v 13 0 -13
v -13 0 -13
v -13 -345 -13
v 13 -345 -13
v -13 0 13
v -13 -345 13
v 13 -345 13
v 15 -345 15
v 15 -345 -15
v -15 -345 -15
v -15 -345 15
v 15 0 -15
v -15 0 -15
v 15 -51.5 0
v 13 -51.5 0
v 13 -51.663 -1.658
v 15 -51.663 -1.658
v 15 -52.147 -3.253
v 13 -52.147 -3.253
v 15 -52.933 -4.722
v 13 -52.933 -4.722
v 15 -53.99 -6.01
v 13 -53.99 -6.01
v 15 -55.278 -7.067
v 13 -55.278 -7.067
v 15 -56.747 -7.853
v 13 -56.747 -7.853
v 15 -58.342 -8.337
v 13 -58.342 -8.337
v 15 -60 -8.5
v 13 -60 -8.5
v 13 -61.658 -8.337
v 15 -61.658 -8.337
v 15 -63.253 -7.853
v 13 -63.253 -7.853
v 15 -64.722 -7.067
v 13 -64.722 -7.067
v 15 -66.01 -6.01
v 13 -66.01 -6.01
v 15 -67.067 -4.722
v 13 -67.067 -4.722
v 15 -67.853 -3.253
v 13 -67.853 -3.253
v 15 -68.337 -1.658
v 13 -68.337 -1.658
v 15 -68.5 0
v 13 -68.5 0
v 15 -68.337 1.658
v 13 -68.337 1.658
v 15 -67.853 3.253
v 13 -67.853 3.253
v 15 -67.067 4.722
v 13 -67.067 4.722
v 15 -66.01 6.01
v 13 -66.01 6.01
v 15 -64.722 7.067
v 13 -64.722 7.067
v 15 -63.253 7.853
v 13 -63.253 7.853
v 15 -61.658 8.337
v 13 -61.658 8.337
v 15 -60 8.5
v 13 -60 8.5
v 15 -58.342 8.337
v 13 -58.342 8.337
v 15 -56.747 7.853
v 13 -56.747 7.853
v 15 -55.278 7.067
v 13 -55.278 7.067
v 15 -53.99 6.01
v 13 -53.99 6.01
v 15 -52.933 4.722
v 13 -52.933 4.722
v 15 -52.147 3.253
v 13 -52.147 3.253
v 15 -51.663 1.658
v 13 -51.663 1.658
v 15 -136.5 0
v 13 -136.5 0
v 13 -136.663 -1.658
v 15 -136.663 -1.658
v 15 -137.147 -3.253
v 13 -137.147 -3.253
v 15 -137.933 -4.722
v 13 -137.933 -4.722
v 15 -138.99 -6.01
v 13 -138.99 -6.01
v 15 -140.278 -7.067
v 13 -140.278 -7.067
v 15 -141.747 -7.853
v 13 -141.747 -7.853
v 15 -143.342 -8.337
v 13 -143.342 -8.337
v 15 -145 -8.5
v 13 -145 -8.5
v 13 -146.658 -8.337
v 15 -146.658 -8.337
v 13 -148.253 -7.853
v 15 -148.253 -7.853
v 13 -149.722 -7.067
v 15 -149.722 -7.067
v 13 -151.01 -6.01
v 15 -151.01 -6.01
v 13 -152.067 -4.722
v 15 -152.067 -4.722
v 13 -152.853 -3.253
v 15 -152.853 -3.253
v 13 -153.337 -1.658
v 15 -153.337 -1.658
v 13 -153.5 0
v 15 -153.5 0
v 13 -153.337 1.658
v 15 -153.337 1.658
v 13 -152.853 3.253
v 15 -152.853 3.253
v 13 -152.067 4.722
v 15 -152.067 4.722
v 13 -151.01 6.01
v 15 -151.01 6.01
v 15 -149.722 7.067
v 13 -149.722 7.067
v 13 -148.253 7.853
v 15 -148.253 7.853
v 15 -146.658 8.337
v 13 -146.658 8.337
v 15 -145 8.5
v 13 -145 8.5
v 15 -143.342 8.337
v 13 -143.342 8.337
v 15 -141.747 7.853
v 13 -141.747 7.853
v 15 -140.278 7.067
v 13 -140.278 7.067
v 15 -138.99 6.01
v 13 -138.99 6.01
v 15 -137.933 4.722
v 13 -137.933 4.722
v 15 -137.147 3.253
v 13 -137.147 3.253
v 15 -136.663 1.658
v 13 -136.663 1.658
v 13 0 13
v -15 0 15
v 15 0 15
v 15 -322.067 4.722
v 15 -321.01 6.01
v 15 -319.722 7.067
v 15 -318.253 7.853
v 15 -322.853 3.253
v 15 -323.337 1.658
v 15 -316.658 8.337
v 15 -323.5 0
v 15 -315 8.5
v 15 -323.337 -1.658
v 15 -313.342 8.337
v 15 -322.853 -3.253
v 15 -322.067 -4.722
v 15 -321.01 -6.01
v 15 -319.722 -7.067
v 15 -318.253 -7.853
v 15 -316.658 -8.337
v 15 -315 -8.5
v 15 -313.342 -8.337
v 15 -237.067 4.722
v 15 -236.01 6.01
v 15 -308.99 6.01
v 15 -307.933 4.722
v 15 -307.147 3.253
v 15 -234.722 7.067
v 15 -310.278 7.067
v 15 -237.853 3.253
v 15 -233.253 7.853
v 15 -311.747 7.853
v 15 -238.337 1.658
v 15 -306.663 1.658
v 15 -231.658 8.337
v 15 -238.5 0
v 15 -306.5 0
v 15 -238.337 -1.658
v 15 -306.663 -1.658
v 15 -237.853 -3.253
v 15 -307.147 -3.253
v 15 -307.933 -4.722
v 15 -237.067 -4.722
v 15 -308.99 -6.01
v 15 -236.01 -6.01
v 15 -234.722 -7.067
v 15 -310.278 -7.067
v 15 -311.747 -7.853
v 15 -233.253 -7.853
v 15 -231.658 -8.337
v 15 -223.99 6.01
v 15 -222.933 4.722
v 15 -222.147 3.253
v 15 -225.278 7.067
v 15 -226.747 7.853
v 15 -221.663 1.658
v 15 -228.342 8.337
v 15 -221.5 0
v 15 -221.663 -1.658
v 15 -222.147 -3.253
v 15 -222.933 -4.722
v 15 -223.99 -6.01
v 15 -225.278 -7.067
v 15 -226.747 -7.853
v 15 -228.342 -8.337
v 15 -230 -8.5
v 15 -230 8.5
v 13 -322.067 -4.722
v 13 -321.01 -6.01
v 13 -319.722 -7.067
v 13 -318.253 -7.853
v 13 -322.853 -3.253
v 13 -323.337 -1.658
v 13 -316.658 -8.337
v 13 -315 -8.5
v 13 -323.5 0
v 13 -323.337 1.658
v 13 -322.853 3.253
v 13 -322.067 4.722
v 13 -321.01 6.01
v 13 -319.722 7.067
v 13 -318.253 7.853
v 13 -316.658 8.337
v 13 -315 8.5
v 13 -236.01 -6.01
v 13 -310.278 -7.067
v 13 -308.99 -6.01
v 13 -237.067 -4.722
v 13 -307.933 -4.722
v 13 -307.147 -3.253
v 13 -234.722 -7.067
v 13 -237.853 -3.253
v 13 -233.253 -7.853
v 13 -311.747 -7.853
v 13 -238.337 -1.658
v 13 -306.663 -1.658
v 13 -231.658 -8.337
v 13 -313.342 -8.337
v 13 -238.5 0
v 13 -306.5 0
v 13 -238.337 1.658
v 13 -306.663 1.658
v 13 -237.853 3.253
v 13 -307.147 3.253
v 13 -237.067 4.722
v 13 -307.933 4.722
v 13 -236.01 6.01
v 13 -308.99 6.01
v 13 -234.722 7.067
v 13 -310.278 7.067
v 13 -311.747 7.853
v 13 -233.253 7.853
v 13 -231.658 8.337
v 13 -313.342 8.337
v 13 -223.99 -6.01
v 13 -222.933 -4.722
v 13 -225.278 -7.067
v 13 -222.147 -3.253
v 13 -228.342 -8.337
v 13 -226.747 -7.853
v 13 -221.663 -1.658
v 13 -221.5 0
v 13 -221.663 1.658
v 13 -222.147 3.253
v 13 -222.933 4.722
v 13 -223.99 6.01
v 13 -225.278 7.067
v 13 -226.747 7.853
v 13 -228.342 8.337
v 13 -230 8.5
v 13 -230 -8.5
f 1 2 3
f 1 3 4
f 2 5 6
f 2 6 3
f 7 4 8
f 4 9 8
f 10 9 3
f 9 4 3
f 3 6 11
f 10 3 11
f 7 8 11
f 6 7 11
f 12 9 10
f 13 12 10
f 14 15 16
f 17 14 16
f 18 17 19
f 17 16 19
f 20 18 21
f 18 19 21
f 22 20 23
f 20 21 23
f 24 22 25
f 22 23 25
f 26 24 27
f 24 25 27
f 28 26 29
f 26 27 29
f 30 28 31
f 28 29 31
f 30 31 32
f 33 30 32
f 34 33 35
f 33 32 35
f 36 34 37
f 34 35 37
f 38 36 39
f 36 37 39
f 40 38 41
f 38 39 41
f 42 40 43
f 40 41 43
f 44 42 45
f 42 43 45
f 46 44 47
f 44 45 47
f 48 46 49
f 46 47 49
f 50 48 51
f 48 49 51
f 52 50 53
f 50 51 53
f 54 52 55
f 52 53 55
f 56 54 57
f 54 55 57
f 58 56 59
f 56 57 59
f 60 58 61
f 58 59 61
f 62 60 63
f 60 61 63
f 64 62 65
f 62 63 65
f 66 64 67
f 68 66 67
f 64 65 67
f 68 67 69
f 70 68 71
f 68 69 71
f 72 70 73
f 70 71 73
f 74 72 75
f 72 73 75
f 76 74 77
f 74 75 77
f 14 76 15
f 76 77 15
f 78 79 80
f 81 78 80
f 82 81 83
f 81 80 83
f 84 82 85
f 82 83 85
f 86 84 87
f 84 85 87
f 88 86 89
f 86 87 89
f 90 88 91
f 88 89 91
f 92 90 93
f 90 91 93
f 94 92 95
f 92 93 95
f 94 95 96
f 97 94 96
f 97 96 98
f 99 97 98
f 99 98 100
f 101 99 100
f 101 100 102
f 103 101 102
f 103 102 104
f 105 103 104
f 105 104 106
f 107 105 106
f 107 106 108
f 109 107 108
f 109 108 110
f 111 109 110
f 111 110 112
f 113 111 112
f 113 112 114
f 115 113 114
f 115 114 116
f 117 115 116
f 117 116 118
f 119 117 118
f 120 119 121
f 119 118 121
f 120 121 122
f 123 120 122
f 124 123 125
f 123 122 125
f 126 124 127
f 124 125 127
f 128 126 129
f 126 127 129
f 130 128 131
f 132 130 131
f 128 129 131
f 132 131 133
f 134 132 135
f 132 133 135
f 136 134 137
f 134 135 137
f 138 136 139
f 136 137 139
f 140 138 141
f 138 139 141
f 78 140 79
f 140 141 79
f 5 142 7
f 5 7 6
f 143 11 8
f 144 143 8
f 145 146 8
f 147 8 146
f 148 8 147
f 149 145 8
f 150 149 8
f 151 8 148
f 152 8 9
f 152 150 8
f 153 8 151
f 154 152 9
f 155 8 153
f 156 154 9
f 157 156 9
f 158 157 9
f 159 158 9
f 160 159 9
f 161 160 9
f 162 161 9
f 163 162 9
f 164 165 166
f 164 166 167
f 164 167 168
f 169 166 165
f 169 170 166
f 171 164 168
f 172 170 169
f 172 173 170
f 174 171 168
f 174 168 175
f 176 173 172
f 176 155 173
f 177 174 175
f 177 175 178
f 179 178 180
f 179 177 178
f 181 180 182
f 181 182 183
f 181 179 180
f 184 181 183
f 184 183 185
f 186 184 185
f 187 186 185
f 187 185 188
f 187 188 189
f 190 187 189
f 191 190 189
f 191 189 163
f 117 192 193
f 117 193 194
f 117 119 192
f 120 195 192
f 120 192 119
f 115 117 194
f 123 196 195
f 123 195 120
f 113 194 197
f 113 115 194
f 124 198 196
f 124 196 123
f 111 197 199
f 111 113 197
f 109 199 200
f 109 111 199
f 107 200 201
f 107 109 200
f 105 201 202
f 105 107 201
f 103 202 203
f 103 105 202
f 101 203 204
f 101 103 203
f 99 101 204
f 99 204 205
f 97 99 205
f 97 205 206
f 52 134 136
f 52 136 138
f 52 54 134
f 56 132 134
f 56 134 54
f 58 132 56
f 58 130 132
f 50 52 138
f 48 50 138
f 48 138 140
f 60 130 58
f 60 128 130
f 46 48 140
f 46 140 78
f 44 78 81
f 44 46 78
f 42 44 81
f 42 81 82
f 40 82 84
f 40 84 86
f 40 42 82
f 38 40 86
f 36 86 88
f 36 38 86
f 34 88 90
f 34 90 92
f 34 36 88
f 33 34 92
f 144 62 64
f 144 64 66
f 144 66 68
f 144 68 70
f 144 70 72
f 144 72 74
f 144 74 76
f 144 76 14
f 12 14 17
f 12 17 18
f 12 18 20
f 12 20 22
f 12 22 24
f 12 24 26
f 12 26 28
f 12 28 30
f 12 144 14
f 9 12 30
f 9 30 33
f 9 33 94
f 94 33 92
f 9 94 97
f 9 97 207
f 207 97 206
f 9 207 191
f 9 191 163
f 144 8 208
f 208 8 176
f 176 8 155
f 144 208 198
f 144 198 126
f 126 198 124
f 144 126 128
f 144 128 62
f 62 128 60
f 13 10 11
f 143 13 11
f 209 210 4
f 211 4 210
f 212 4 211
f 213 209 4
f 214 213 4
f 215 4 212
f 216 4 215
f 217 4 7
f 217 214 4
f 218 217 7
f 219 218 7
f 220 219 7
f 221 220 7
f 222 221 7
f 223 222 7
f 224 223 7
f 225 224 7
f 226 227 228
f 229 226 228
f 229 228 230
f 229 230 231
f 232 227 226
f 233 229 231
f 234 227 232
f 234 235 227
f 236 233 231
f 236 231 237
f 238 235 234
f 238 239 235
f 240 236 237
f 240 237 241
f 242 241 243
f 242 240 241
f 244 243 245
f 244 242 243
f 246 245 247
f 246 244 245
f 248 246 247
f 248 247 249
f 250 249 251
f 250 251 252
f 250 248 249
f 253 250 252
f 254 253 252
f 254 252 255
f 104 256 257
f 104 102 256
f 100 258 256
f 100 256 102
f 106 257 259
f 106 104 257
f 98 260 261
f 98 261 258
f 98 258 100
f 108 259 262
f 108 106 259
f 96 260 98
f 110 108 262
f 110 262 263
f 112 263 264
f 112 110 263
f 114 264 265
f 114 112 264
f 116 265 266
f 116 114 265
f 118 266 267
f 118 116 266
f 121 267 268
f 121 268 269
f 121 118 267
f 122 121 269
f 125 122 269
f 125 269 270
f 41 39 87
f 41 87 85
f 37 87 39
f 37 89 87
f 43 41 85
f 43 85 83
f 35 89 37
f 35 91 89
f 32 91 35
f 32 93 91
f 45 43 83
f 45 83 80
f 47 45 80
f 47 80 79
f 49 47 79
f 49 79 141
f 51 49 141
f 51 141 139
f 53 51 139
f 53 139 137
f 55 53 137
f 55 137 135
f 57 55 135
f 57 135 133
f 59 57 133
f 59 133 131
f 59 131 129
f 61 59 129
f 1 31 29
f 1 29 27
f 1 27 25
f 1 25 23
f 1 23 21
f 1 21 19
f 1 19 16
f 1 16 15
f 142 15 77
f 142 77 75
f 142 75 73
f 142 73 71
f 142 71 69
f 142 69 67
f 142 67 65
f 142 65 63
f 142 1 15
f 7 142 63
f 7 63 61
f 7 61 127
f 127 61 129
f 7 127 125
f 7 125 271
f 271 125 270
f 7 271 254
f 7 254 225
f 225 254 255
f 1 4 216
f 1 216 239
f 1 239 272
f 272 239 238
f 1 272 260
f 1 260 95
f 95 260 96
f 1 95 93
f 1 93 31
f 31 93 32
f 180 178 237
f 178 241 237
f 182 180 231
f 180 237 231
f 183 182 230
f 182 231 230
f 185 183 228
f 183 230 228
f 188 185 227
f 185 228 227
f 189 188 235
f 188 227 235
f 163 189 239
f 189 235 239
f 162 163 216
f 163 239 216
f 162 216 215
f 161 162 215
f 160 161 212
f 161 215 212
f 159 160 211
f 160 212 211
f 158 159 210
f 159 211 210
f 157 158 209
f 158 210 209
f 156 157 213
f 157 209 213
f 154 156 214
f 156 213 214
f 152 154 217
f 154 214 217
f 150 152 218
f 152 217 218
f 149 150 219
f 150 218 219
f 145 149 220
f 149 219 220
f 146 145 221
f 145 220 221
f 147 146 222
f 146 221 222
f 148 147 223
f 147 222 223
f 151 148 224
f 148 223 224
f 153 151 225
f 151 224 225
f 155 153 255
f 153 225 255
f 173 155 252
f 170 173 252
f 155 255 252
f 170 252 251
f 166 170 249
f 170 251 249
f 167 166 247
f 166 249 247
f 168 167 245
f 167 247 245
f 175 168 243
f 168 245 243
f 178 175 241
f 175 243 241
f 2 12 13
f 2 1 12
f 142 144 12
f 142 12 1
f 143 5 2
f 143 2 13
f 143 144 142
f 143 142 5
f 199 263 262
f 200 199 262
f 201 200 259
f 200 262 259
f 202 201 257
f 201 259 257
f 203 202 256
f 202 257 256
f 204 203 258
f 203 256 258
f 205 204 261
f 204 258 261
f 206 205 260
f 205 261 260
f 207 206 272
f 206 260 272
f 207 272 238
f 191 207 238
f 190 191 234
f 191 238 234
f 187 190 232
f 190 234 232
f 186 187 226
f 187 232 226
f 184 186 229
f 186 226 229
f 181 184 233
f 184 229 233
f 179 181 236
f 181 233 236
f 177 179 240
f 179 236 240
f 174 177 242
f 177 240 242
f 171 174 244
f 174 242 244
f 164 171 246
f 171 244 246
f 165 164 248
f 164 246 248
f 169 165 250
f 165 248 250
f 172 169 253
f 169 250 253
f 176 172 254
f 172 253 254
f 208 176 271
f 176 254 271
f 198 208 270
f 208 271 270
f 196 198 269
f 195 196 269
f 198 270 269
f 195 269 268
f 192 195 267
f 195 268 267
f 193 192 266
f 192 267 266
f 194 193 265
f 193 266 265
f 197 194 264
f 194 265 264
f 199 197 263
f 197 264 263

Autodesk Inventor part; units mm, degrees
ref_plane "YZ Plane" through (0, 0, 0) normal (1, 0, 0) x (0, 1, 0)
ref_plane "XZ Plane" through (0, 0, 0) normal (0, 1, 0) x (-1, 0, 0)
ref_plane "XY Plane" through (0, 0, 0) normal (0, 0, 1) x (1, 0, 0)
sketch "Sketch9" plane through (0, 0, 0) normal (0, 1, 0) x (-1, 0, 0)
  line L0 (15, 15) -> (-15, 15)
  line L1 (-15, 15) -> (-15, -15)
  line L2 (-15, -15) -> (15, -15)
  line L3 (15, -15) -> (15, 15)
  line L4 (15, 15) -> (-15, -15) construction
  line L5 (-15, 15) -> (15, -15) construction
  line L6 (-13, 13) -> (13, 13)
  line L7 (13, 13) -> (13, -13)
  line L8 (13, -13) -> (-13, -13)
  line L9 (-13, -13) -> (-13, 13)
  point P0 (0, 0)
  dimension "d172" = 30
  dimension "d173" = 30
  dimension "d174" = 2
extrude "Extrusion3" add sketch "Sketch9" against normal blind 345
sketch "Sketch10" plane through (0, 0, 0) normal (1, 0, 0) x (0, 1, 0)
  line L0 (0, 15) -> (0, -15) construction
  line L1 (0, 15) -> (-345, 15) construction
  line L2 (-345, -15) -> (-345, 15) construction
  line L3 (0, -15) -> (-345, -15) construction
  line L4 (-68.5, 8.5) -> (-51.5, 8.5)
  line L5 (-51.5, 8.5) -> (-51.5, -8.5)
  line L6 (-51.5, -8.5) -> (-68.5, -8.5)
  line L7 (-68.5, -8.5) -> (-68.5, 8.5)
  line L8 (-68.5, 8.5) -> (-51.5, -8.5) construction
  line L9 (-51.5, 8.5) -> (-68.5, -8.5) construction
  line L10 (0, 0) -> (30, 0)
  circle A0 centre (-60, 0) radius 8.5
  dimension "d177" = 17
  dimension "d178" = 17
  dimension "d181" = 30
  dimension "d182" = 90
extrude "Extrusion4" cut sketch "Sketch10" along normal through all contours A0
pattern_linear "Rectangular Pattern4" count 4 spacing 85 along (0, -1, 0) of "Extrusion4"
properties part number "SLM 1661 FDS 1000 way tube 1" material "Stainless Steel"
